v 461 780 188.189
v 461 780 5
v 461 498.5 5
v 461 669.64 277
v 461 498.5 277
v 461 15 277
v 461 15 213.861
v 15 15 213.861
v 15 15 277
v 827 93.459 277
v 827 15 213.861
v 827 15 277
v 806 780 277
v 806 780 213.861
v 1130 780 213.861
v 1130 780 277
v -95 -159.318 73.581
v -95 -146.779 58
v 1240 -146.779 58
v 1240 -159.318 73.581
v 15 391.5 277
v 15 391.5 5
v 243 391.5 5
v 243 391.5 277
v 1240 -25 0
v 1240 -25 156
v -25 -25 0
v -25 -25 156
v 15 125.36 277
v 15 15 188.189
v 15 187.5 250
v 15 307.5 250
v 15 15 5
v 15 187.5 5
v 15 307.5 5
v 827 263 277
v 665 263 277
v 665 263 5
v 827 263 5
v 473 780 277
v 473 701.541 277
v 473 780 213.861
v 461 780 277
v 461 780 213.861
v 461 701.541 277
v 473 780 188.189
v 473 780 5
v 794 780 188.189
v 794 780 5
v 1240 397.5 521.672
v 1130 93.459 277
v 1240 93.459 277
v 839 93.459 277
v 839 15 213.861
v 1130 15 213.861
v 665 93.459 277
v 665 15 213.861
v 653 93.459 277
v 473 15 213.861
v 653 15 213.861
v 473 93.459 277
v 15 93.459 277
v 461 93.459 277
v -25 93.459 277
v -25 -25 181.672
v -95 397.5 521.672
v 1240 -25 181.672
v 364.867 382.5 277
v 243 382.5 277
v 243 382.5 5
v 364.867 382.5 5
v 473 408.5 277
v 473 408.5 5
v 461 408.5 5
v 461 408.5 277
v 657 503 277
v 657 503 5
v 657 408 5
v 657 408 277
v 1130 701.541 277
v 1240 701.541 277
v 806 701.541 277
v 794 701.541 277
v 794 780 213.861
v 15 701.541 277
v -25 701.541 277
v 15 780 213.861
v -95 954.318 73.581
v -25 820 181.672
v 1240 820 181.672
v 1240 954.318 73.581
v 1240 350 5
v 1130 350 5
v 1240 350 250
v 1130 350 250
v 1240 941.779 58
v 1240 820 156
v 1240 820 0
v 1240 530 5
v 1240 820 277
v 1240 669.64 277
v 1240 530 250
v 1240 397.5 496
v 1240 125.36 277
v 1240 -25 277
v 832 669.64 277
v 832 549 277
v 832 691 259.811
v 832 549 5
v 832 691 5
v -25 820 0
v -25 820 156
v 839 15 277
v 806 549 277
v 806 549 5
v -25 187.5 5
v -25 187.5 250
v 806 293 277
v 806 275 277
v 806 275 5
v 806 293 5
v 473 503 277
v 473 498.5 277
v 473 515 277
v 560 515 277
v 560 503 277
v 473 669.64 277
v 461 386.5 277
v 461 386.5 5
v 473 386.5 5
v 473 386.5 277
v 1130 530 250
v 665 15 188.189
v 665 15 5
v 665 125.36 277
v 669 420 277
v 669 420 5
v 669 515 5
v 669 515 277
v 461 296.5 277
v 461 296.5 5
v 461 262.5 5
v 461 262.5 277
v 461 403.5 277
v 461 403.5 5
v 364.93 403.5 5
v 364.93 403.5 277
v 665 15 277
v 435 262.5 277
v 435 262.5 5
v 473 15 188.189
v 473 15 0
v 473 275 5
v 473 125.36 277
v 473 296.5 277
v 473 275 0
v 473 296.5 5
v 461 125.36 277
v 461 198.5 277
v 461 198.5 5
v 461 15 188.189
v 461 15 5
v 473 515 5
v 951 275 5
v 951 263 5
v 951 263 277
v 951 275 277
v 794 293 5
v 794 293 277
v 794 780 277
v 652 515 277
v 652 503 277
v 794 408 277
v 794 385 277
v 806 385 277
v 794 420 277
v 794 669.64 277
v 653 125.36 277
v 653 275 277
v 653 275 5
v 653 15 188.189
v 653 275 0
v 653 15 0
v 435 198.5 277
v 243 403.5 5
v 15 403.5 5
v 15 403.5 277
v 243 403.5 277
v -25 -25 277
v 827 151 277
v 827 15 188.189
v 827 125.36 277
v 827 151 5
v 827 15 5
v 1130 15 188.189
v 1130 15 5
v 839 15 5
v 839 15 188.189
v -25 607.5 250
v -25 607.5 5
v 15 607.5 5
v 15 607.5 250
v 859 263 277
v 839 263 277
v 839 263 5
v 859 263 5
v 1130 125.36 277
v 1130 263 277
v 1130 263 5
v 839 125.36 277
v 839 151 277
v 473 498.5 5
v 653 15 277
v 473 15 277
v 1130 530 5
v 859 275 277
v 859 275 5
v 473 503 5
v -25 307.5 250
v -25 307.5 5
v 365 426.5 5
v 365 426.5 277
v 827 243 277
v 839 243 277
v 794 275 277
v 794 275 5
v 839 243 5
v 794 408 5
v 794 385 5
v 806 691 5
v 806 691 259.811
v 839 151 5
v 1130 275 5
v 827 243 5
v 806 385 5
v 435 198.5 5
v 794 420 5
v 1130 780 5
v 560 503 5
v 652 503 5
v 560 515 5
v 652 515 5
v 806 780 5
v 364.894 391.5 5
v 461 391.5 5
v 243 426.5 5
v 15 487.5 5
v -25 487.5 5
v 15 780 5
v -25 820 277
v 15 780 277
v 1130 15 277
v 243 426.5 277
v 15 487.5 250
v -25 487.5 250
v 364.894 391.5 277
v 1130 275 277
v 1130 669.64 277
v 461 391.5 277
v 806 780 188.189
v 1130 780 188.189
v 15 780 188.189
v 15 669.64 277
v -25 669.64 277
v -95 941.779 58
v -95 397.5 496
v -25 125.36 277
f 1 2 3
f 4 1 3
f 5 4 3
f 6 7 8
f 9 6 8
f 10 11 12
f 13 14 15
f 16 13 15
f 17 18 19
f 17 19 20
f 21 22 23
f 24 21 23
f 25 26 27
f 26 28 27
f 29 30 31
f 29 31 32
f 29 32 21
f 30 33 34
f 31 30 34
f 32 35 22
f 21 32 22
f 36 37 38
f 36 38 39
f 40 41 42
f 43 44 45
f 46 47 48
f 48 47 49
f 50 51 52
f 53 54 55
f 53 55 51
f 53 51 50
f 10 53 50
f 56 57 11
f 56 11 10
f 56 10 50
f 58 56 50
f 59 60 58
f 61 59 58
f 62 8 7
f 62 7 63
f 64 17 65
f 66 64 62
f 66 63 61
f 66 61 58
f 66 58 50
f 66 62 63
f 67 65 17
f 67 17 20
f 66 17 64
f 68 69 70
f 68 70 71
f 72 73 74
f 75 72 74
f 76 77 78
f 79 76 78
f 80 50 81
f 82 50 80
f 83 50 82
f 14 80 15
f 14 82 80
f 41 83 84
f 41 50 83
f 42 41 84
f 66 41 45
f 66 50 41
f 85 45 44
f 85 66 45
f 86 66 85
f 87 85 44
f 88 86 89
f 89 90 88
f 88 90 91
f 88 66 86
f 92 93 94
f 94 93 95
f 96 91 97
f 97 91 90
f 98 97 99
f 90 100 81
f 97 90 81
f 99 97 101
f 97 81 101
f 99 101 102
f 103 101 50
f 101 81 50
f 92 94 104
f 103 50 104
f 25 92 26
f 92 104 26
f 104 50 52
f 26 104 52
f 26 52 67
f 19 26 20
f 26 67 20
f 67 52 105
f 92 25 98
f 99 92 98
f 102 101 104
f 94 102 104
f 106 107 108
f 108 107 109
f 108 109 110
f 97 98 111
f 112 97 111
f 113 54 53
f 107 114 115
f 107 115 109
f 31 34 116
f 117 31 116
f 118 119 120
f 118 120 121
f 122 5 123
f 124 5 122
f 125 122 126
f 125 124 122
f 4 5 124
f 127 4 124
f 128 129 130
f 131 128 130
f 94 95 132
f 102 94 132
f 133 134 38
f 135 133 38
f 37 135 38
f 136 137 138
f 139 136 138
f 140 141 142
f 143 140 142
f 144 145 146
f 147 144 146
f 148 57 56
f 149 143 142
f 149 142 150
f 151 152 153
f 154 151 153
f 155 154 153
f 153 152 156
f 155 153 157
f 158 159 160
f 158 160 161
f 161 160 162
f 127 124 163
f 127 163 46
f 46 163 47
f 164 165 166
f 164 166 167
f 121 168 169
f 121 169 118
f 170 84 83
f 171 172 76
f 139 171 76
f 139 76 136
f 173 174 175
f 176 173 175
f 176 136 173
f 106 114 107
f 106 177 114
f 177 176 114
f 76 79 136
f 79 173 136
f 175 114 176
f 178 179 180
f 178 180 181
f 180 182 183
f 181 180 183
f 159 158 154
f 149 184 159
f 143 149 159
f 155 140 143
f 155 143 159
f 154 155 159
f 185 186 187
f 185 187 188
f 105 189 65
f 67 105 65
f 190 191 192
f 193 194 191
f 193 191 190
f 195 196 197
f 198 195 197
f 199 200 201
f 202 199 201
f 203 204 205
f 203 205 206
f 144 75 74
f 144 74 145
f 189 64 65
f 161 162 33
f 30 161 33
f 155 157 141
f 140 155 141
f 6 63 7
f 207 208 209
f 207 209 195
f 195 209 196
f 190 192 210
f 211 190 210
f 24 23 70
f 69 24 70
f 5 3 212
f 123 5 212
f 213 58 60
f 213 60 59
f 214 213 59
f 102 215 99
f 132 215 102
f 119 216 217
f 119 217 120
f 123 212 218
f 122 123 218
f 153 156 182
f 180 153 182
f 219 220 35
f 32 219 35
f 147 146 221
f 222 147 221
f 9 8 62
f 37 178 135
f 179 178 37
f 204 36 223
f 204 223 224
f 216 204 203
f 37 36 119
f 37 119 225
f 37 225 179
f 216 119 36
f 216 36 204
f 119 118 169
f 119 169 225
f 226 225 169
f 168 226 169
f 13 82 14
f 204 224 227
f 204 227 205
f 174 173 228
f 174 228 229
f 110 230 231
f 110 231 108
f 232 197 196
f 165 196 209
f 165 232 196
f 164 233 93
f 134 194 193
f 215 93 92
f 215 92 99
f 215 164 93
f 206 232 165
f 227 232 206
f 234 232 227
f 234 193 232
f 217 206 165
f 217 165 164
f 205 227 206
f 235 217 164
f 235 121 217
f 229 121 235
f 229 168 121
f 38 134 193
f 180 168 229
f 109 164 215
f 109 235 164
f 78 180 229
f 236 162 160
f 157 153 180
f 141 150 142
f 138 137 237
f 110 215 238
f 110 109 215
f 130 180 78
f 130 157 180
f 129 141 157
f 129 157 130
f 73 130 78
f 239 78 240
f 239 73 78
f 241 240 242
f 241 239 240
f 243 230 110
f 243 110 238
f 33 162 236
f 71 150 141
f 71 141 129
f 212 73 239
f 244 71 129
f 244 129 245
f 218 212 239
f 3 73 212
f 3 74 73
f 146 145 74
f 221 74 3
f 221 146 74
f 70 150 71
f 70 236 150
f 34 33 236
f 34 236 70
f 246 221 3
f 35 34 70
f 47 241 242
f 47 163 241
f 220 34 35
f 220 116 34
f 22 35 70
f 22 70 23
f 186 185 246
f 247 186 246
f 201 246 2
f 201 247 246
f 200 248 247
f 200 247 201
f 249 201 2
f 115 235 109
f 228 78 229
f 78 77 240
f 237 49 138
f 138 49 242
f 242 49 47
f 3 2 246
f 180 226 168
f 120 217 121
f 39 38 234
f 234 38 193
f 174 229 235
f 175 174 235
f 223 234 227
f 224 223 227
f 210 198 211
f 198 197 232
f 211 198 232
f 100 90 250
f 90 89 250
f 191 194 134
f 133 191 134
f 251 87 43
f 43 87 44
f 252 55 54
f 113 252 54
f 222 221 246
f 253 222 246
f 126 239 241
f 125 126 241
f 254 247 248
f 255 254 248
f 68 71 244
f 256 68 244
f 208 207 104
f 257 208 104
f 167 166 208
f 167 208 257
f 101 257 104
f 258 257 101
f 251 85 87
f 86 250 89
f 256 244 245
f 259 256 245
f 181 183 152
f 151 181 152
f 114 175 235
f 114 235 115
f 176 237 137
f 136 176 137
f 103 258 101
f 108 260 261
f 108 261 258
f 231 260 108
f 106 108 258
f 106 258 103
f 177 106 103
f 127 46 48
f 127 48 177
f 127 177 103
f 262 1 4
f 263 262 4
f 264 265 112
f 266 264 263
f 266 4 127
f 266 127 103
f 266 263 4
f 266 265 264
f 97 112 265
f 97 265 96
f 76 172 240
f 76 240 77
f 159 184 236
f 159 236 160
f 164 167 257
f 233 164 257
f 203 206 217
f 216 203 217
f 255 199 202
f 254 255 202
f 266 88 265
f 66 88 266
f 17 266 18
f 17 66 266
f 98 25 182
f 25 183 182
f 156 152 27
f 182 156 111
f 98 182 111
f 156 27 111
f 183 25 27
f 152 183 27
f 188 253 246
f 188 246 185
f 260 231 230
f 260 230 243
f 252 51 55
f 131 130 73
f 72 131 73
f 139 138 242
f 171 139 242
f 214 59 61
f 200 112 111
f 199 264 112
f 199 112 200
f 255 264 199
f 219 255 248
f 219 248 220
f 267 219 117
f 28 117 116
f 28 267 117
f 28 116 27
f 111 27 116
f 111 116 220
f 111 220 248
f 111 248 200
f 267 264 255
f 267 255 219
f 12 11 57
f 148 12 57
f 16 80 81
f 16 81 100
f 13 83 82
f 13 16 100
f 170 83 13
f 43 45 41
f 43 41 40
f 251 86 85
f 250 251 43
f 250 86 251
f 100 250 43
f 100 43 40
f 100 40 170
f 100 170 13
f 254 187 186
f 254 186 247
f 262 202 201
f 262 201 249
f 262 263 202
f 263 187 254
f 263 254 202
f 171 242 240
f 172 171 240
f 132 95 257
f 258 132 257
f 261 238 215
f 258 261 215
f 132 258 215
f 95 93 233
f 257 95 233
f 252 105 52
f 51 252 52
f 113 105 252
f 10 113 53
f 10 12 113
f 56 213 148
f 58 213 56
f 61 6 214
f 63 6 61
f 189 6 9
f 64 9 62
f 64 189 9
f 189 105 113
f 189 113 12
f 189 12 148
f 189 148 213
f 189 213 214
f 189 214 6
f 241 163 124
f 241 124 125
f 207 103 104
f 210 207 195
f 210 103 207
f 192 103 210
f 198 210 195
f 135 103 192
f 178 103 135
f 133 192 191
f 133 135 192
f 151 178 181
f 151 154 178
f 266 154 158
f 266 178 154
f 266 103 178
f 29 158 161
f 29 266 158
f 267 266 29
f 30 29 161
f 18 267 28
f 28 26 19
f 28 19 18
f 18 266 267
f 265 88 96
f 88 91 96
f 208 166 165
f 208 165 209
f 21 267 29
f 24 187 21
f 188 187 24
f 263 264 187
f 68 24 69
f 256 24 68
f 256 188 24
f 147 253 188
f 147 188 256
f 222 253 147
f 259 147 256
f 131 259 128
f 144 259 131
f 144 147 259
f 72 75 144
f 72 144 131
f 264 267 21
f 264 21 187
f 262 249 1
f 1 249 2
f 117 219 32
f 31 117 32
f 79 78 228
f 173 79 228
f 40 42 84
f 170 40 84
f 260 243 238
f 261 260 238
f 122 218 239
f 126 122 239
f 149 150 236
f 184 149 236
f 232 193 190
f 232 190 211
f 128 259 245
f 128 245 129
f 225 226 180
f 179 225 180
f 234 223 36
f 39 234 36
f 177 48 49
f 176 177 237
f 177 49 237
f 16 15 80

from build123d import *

# Parameters (mm, degrees)
F0_W     = 179
F0_H     = 12
F0_W_2   = 138
F0_H_2   = 40
F0_W_3   = 40
F0_H_3   = 120
F0_W_4   = 92
F0_W_5   = 12
F0_H_4   = 90
F0_H_5   = 180
F0_W_6   = 87
F0_H_6   = 92
F0_W_7   = 26
F0_H_7   = 142
F0_H_8   = 136
F0_W_8   = 228
F0_H_9   = 18
F0_H_10  = 20
F0_W_9   = 20
F1_DEPTH = 5
F2_DEPTH = 277
F3_W     = 40
F3_H     = 120
F3_H_2   = 180
F4_DEPTH = 27
F6_DEPTH = 70
F7_DEPTH = 1265
F8_DEPTH = 70


with BuildPart() as f1:
    # F0 (on Top) → F1 (new body)
    with BuildSketch(Plane.XY):
        with Locations((1040.5, 269)):
            Rectangle(F0_W, F0_H)
        Polygon((794, 408), (794, 420), (669, 420), (669, 515), (652, 515), (652, 503), (657, 503), (657, 408), align=None)
        with Locations((392, -5)):
            Rectangle(F0_W_2, F0_H_2)
        Polygon((1130, 350), (1130, 530), (1130, 780), (806, 780), (806, 691), (832, 691), (832, 549), (806, 549), (806, 385), (806, 293), (806, 275), (839, 275), (859, 275), (951, 275), (1130, 275), align=None)
        with Locations((-5, 547.5)):
            Rectangle(F0_W_3, F0_H_3)
        with Locations((-5, 247.5)):
            Rectangle(F0_W_3, F0_H_3)
        Polygon((15, 487.5), (-25, 487.5), (-25, 307.5), (15, 307.5), (15, 382.1609020233), (15, 391.5), (15, 403.5), align=None)
        Polygon((15, 187.5), (-25, 187.5), (-25, -25), (323, -25), (323, 15), (15, 15), align=None)
        Polygon((1130, 15), (1130, 263), (951, 263), (859, 263), (839, 263), (839, 243), (839, 151), (839, 15), align=None)
        with Locations((905, 269)):
            Rectangle(F0_W_4, F0_H)
        Polygon((364.8940163038, 391.5), (243, 391.5), (243, 382.5), (364.8667633533, 382.5), align=None)
        Polygon((473, 780), (461, 780), (461, 498.5), (473, 498.5), (473, 503), (473, 515), align=None)
        with Locations((467, 453.5)):
            Rectangle(F0_W_5, F0_H_4)
        Polygon((243, 426.5), (243, 403.5), (364.9303535711, 403.5), (365, 426.5), align=None)
        Polygon((473, 503), (473, 498.5), (473, 408.5), (473, 386.5), (473, 296.5), (473, 275), (653, 275), (670, 275), (794, 275), (794, 293), (794, 385), (794, 408), (657, 408), (657, 503), (652, 503), (560, 503), align=None)
        with Locations((1150, 440)):
            Rectangle(F0_W_3, F0_H_5)
        Polygon((665, 263), (665, 15), (827, 15), (827, 151), (827, 243), (827, 263), (806, 263), (794, 263), align=None)
        with Locations((516.5, 509)):
            Rectangle(F0_W_6, F0_H)
        with Locations((467, 341.5)):
            Rectangle(F0_W_5, F0_H_4)
        Polygon((15, 382.1609020233), (15, 307.5), (15, 187.5), (15, 15), (323, 15), (461, 15), (461, 198.5), (435, 198.5), (435, 262.5), (461, 262.5), (461, 296.5), (461, 386.5), (461, 391.5), (365, 391.5), (364.8940163038, 391.5), (364.8667633533, 382.5), (243, 382.5), (243, 391.5), (15, 391.5), align=None)
        Polygon((1170, 530), (1170, 820), (-25, 820), (-25, 607.5), (15, 607.5), (15, 780), (461, 780), (473, 780), (794, 780), (806, 780), (1130, 780), (1130, 530), align=None)
        with Locations((833, 197)):
            Rectangle(F0_W_5, F0_H_6)
        Polygon((461, 198.5), (461, 15), (473, 15), (473, 275), (473, 296.5), (461, 296.5), (461, 262.5), (435, 262.5), (435, 198.5), align=None)
        Polygon((794, 420), (794, 780), (473, 780), (473, 515), (560, 515), (652, 515), (669, 515), (669, 420), align=None)
        with Locations((819, 620)):
            Rectangle(F0_W_7, F0_H_7)
        with Locations((606, 509)):
            Rectangle(F0_W_4, F0_H)
        with Locations((833, 83)):
            Rectangle(F0_W_5, F0_H_8)
        Polygon((653, 275), (653, 15), (665, 15), (665, 263), (794, 263), (794, 275), (670, 275), align=None)
        Polygon((1170, -25), (1170, 350), (1130, 350), (1130, 275), (1130, 263), (1130, 15), (839, 15), (827, 15), (665, 15), (653, 15), (473, 15), (461, 15), (461, -25), align=None)
        with Locations((800, 339)):
            Rectangle(F0_W_5, F0_H_6)
        with Locations((129, 397.5)):
            Rectangle(F0_W_8, F0_H)
        with Locations((800, 284)):
            Rectangle(F0_W_5, F0_H_9)
        Polygon((806, 691), (806, 780), (794, 780), (794, 420), (794, 408), (794, 385), (806, 385), (806, 549), align=None)
        with Locations((833, 253)):
            Rectangle(F0_W_5, F0_H_10)
        Polygon((839, 263), (839, 275), (806, 275), (806, 263), (827, 263), align=None)
        with Locations((849, 269)):
            Rectangle(F0_W_9, F0_H)
        Polygon((365, 403.5), (364.9303535711, 403.5), (364.8940163038, 391.5), (365, 391.5), (461, 391.5), (461, 386.5), (473, 386.5), (473, 408.5), (461, 408.5), (461, 403.5), align=None)
        Polygon((364.9303535711, 403.5), (243, 403.5), (243, 391.5), (364.8940163038, 391.5), align=None)
        with Locations((800, 269)):
            Rectangle(F0_W_5, F0_H)
        Polygon((15, 780), (15, 607.5), (15, 487.5), (15, 403.5), (243, 403.5), (243, 426.5), (365, 426.5), (364.9303535711, 403.5), (365, 403.5), (461, 403.5), (461, 408.5), (461, 498.5), (461, 780), align=None)
    extrude(amount=F1_DEPTH)

    # F0 (on Top) → F2 (join)
    with BuildSketch(Plane.XY):
        Polygon((15, 187.5), (-25, 187.5), (-25, -25), (323, -25), (323, 15), (15, 15), align=None)
        with Locations((392, -5)):
            Rectangle(F0_W_2, F0_H_2)
        Polygon((1170, -25), (1170, 350), (1130, 350), (1130, 275), (1130, 263), (1130, 15), (839, 15), (827, 15), (665, 15), (653, 15), (473, 15), (461, 15), (461, -25), align=None)
        with Locations((833, 83)):
            Rectangle(F0_W_5, F0_H_8)
        Polygon((653, 275), (653, 15), (665, 15), (665, 263), (794, 263), (794, 275), (670, 275), align=None)
        Polygon((461, 198.5), (461, 15), (473, 15), (473, 275), (473, 296.5), (461, 296.5), (461, 262.5), (435, 262.5), (435, 198.5), align=None)
        Polygon((15, 487.5), (-25, 487.5), (-25, 307.5), (15, 307.5), (15, 382.1609020233), (15, 391.5), (15, 403.5), align=None)
        with Locations((129, 397.5)):
            Rectangle(F0_W_8, F0_H)
        Polygon((243, 426.5), (243, 403.5), (364.9303535711, 403.5), (365, 426.5), align=None)
        Polygon((364.9303535711, 403.5), (243, 403.5), (243, 391.5), (364.8940163038, 391.5), align=None)
        Polygon((364.8940163038, 391.5), (243, 391.5), (243, 382.5), (364.8667633533, 382.5), align=None)
        Polygon((365, 403.5), (364.9303535711, 403.5), (364.8940163038, 391.5), (365, 391.5), (461, 391.5), (461, 386.5), (473, 386.5), (473, 408.5), (461, 408.5), (461, 403.5), align=None)
        Polygon((473, 780), (461, 780), (461, 498.5), (473, 498.5), (473, 503), (473, 515), align=None)
        with Locations((516.5, 509)):
            Rectangle(F0_W_6, F0_H)
        Polygon((794, 408), (794, 420), (669, 420), (669, 515), (652, 515), (652, 503), (657, 503), (657, 408), align=None)
        Polygon((806, 691), (806, 780), (794, 780), (794, 420), (794, 408), (794, 385), (806, 385), (806, 549), align=None)
        with Locations((833, 253)):
            Rectangle(F0_W_5, F0_H_10)
        with Locations((849, 269)):
            Rectangle(F0_W_9, F0_H)
        Polygon((839, 263), (839, 275), (806, 275), (806, 263), (827, 263), align=None)
        with Locations((800, 269)):
            Rectangle(F0_W_5, F0_H)
        with Locations((800, 284)):
            Rectangle(F0_W_5, F0_H_9)
        with Locations((1040.5, 269)):
            Rectangle(F0_W, F0_H)
        Polygon((1170, 530), (1170, 820), (-25, 820), (-25, 607.5), (15, 607.5), (15, 780), (461, 780), (473, 780), (794, 780), (806, 780), (1130, 780), (1130, 530), align=None)
        with Locations((819, 620)):
            Rectangle(F0_W_7, F0_H_7)
    extrude(amount=F2_DEPTH)

    # F3 (on face) → F4 (join)
    with BuildSketch(Plane.XY.offset(277)):
        with Locations((-5, 547.5)):
            Rectangle(F3_W, F3_H)
        with Locations((-5, 397.5)):
            Rectangle(F3_W, F3_H_2)
        with Locations((-5, 247.5)):
            Rectangle(F3_W, F3_H)
        with Locations((1150, 440)):
            Rectangle(F3_W, F3_H_2)
    extrude(amount=-F4_DEPTH)

    # F5 (on face) → F6 (join)
    with BuildSketch(Plane(origin=(-25, 0, 0), x_dir=(0, -1, 0), z_dir=(-1, 0, 0))):
        Polygon((-365.5990801838, 496), (-397.5, 496), (-125.3602941176, 277), (-93.4593743014, 277), align=None)
        Polygon((-93.4593743014, 277), (-125.3602941176, 277), (25, 156), (25, 181.6717461243), align=None)
        Polygon((25, 181.6717461243), (25, 156), (146.7794117647, 58), (159.3182351687, 73.5813320241), align=None)
        Polygon((-429.4009198162, 496), (-397.5, 496), (-365.5990801838, 496), (-397.5, 521.6717461243), align=None)
        Polygon((-669.6397058824, 277), (-397.5, 496), (-429.4009198162, 496), (-701.5406256986, 277), align=None)
        Polygon((-941.7794117647, 58), (-820, 156), (-820, 181.6717461243), (-954.3182351687, 73.5813320241), align=None)
        Polygon((-820, 156), (-669.6397058824, 277), (-701.5406256986, 277), (-820, 181.6717461243), align=None)
    extrude(amount=F6_DEPTH)

    # F7 (add, through all): a face of the model
    f7_faces = [f1.faces().sort_by_distance(p)[0] for p in [
        (-95, 117.7974560425, 286.3979384905),
    ]]
    extrude(f7_faces, amount=-F7_DEPTH)

    # F8 (add): a face of the model
    f8_faces = [f1.faces().sort_by_distance(p)[0] for p in [
        (1170, 807.7023270544, 229.3358730621),
    ]]
    extrude(f8_faces, amount=F8_DEPTH)


solid = f1.part
